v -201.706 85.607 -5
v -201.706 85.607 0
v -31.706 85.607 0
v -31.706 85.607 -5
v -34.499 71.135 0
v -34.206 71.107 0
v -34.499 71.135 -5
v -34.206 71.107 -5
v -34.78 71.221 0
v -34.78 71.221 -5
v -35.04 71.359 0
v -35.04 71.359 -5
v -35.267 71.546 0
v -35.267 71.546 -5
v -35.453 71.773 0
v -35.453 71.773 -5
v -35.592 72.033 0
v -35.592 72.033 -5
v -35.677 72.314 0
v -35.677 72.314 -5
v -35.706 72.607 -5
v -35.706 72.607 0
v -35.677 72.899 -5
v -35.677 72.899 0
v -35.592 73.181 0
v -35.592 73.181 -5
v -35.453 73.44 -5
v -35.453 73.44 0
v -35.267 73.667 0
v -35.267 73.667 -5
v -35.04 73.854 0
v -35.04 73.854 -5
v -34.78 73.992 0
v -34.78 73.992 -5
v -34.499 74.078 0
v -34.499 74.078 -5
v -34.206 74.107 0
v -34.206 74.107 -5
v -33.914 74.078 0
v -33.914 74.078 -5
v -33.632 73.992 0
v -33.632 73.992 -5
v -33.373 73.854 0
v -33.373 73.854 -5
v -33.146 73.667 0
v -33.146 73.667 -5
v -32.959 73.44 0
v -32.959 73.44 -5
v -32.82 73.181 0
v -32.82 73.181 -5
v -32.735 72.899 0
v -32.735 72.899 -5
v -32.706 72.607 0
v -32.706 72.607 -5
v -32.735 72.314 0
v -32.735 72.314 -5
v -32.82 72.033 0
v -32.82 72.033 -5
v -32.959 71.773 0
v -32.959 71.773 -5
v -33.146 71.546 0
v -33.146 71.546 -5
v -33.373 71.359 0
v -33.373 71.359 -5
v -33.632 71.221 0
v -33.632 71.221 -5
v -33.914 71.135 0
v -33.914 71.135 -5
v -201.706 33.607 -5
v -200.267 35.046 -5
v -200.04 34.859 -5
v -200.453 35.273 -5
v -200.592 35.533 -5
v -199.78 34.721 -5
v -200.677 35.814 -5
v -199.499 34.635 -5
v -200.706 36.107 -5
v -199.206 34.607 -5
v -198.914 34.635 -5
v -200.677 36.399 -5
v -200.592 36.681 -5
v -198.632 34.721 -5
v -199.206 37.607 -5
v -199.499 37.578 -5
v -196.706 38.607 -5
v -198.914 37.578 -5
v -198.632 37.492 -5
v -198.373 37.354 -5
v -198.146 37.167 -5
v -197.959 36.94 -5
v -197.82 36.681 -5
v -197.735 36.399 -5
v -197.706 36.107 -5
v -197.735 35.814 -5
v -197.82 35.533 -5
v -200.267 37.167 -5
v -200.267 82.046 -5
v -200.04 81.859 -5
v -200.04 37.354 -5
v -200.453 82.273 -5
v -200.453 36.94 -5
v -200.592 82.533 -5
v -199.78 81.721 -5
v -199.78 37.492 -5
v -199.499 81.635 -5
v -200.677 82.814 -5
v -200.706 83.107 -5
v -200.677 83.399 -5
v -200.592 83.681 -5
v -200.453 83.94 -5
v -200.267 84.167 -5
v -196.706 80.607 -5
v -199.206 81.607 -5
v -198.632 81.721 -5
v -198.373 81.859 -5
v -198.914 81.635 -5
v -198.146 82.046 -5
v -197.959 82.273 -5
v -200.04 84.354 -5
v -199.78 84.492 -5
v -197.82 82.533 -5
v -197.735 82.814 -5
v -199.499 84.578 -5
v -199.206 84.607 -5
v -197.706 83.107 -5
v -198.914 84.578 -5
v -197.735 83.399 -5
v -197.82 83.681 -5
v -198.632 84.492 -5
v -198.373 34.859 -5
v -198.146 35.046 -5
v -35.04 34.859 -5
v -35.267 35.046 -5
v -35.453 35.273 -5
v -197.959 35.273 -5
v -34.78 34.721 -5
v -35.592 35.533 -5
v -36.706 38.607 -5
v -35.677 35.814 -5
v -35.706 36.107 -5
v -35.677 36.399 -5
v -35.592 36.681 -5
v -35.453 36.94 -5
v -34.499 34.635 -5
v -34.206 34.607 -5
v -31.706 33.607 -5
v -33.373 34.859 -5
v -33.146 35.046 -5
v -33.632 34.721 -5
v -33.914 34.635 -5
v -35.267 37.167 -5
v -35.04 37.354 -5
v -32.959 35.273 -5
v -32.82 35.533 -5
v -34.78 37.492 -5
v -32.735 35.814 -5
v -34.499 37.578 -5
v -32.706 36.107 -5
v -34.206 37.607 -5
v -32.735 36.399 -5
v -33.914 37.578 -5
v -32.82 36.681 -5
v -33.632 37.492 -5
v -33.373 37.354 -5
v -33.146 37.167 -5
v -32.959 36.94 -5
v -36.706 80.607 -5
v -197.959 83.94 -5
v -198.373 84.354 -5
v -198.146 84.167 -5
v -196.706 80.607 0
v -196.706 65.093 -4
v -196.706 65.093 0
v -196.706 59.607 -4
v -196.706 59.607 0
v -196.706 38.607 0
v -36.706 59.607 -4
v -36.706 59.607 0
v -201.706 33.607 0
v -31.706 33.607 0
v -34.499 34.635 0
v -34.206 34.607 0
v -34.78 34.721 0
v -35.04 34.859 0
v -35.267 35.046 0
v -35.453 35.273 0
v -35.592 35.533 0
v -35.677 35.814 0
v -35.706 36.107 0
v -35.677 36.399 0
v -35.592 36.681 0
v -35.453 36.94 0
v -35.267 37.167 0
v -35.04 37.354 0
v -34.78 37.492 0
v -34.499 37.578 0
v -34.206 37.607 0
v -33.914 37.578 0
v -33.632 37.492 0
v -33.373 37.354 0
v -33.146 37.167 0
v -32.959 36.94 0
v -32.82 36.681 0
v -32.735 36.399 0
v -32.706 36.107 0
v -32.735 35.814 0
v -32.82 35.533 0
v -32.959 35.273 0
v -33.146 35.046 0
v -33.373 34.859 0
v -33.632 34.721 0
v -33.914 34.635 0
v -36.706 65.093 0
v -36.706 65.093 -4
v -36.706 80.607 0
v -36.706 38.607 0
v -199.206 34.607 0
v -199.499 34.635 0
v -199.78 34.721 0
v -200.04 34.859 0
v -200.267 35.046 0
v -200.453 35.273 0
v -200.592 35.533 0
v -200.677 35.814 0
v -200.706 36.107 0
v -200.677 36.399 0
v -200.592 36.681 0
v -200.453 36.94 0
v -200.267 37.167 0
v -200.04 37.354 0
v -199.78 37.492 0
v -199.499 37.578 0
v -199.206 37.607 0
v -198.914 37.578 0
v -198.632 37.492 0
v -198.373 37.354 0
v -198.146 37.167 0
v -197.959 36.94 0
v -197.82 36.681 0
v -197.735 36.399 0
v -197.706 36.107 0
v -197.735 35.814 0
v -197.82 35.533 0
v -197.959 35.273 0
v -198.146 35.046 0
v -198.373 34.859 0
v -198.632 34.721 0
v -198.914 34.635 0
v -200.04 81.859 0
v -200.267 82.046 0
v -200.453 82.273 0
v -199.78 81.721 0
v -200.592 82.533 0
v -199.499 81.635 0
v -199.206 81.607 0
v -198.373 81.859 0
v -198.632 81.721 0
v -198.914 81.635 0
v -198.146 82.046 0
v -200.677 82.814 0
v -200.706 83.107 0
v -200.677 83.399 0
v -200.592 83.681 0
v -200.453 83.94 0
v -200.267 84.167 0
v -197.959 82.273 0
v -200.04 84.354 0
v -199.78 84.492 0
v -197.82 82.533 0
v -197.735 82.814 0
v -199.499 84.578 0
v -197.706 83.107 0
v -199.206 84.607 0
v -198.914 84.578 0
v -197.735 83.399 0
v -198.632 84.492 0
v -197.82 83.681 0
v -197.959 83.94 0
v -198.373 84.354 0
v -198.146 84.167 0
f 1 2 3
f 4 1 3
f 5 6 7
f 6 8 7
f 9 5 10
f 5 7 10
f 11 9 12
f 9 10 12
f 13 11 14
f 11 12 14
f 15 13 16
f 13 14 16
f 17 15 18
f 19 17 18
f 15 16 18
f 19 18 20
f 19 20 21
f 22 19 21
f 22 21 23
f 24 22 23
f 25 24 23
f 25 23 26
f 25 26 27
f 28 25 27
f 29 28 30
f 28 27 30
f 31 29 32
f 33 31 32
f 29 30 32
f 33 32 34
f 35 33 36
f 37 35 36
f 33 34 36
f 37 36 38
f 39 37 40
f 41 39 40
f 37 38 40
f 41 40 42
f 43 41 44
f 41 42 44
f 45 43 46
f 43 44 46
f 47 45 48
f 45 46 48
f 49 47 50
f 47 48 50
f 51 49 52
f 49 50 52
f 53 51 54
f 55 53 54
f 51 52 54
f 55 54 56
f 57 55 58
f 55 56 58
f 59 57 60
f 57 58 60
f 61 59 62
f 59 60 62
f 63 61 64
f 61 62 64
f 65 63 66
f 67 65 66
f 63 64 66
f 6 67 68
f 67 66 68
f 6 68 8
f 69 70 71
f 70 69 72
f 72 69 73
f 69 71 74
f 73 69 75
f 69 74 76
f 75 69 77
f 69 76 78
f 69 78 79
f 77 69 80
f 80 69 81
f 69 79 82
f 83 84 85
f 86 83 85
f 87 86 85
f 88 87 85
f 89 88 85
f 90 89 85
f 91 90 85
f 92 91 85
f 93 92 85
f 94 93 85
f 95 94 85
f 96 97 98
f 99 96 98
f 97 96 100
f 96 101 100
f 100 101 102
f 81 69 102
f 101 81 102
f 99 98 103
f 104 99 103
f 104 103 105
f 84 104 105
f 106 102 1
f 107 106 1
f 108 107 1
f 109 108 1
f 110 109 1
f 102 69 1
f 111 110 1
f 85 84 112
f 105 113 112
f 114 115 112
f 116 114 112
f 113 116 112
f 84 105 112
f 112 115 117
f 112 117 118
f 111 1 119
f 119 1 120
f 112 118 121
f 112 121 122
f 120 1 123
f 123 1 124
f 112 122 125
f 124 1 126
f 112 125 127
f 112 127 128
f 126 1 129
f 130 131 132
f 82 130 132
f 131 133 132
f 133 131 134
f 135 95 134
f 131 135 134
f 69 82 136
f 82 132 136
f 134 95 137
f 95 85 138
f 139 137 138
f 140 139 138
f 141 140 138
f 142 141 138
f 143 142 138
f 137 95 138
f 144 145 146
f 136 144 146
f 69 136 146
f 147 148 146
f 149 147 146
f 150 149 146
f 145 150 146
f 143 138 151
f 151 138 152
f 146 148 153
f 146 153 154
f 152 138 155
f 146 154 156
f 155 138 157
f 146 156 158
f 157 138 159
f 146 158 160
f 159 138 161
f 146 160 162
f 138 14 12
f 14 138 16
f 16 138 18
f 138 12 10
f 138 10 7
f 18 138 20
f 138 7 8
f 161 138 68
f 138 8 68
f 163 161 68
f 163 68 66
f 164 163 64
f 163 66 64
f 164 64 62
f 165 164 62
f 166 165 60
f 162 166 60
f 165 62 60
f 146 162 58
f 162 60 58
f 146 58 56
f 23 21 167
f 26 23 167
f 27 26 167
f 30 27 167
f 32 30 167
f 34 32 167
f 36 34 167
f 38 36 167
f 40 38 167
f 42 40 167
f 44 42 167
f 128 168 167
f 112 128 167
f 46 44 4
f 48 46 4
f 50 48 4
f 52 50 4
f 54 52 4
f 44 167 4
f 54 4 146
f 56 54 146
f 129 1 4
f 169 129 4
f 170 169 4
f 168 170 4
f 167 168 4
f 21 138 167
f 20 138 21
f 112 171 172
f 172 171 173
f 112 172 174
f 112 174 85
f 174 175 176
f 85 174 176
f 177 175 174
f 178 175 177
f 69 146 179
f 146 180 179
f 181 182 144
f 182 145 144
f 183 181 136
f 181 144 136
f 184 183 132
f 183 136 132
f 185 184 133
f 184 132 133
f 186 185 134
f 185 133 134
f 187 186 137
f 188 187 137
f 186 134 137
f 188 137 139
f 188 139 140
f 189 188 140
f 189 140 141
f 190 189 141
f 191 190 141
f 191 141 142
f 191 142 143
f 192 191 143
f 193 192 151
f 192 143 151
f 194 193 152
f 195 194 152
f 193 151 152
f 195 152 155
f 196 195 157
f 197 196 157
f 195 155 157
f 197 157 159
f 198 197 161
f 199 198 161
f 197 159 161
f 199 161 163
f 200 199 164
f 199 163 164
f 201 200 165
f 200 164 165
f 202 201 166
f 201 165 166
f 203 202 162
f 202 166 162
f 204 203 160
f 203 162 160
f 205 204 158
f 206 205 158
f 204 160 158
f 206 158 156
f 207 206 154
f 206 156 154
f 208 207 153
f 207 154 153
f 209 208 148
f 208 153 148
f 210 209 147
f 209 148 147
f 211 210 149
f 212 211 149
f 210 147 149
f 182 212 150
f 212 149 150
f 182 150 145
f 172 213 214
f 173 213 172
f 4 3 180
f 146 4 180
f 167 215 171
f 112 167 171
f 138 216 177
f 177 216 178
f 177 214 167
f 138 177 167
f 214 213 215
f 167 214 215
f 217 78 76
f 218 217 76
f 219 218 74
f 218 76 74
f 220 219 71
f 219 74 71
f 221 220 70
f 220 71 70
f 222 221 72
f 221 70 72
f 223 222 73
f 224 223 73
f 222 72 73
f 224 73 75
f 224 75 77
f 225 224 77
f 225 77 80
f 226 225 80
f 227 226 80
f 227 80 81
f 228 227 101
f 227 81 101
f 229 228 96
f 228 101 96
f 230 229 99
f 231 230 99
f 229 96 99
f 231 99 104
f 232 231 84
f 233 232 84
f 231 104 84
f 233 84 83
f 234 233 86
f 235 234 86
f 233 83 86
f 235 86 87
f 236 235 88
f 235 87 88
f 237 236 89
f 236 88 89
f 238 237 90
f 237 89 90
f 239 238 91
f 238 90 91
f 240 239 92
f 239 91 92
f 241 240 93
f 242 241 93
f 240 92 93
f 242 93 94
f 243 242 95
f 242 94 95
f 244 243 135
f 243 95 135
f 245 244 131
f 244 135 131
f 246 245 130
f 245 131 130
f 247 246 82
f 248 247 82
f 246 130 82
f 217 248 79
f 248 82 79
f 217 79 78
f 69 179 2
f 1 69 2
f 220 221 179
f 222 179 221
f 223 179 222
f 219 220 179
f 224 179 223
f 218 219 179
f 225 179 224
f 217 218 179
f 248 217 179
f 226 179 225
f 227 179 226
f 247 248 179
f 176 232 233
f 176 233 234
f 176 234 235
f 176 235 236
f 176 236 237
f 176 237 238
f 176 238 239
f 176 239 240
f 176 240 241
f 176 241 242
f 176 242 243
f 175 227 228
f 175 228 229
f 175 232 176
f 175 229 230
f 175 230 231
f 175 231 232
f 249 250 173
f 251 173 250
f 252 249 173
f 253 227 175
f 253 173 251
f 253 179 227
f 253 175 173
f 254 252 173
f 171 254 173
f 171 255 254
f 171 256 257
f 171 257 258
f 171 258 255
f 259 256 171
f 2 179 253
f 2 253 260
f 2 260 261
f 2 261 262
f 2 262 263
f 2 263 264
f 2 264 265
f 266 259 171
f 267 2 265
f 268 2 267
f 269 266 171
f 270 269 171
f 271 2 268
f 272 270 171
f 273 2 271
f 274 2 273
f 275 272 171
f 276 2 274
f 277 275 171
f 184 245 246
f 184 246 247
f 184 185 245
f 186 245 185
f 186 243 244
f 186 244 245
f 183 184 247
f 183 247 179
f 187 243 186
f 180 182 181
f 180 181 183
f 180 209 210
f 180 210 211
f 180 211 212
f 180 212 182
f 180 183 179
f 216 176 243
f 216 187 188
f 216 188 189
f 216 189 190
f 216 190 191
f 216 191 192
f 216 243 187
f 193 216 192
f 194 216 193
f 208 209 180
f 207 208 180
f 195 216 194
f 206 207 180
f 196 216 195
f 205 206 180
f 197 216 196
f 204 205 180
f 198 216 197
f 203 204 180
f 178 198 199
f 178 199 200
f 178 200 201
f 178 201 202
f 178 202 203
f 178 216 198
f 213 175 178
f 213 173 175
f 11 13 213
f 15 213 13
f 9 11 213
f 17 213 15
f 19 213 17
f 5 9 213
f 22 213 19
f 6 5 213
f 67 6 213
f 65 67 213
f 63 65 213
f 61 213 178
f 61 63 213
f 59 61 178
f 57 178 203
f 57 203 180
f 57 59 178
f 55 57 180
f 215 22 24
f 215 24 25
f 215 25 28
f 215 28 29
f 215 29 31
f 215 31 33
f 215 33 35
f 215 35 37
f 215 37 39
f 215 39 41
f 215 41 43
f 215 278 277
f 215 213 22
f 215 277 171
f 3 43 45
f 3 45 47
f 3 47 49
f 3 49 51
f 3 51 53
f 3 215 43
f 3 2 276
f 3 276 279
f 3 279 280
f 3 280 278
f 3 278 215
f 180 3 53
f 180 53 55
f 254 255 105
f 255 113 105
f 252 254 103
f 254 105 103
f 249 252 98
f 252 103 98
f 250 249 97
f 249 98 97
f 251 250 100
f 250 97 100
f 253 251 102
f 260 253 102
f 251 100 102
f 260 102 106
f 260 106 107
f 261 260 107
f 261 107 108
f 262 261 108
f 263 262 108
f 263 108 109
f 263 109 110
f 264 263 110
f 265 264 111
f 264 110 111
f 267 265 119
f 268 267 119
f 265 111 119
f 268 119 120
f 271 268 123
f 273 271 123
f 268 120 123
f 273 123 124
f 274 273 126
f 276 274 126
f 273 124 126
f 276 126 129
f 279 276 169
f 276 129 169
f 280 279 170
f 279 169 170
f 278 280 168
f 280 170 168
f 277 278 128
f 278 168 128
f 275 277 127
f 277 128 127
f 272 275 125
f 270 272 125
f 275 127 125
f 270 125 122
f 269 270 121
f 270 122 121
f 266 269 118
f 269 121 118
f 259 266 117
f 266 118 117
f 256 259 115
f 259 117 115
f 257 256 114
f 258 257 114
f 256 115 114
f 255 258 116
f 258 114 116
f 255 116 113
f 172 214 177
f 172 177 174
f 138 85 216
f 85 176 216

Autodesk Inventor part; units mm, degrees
ref_plane "YZ Plane" through (0, 0, 0) normal (1, 0, 0) x (0, 1, 0)
ref_plane "XZ Plane" through (0, 0, 0) normal (0, 1, 0) x (-1, 0, 0)
sketch "Sketch1" plane through (0, 0, 0) normal (0, 0, 1) x (1, 0, 0)
  line L0 (-201.7062, 85.6066) -> (-31.7062, 85.6066)
  line L1 (-31.7062, 85.6066) -> (-31.7062, 33.6066)
  line L2 (-31.7062, 33.6066) -> (-201.7062, 33.6066)
  line L3 (-201.7062, 33.6066) -> (-201.7062, 85.6066)
  line L4 (-36.7062, 80.6066) -> (-196.7062, 80.6066)
  line L5 (-196.7062, 38.6066) -> (-36.7062, 38.6066)
  line L6 (-196.7062, 59.6066) -> (-36.7062, 59.6066)
  line L7 (-36.7062, 65.0934) -> (-196.7062, 65.0934)
  line L8 (-36.7062, 38.6066) -> (-36.7062, 59.6066)
  line L9 (-36.7062, 65.0934) -> (-36.7062, 80.6066)
  line L10 (-196.7062, 80.6066) -> (-196.7062, 65.0934)
  line L11 (-196.7062, 59.6066) -> (-196.7062, 38.6066)
  line L12 (-196.7062, 80.6066) -> (-201.7062, 80.6066)
  line L13 (-36.7062, 80.6066) -> (-31.7062, 80.6066)
  line L14 (-36.7062, 80.6066) -> (-36.7062, 85.6066)
  line L15 (-36.7062, 38.6066) -> (-36.7062, 33.6066)
  line L16 (-36.7062, 38.6066) -> (-31.7062, 38.6066)
  line L17 (-196.7062, 38.6066) -> (-201.7062, 38.6066)
  line L18 (-196.7062, 38.6066) -> (-196.7062, 33.6066)
  line L19 (-196.7062, 80.6066) -> (-196.7062, 85.6066)
  circle A0 centre (-199.2062, 83.1066) radius 2.5
  circle A1 centre (-199.2062, 36.1066) radius 2.5
  circle A2 centre (-34.2062, 36.1066) radius 2.5
  circle A3 centre (-34.2062, 72.6066) radius 2.5
  point P0 (0, 0)
extrude "Extrusion1" add sketch "Sketch1" against normal blind 5 contours L19 A0 L0 | L0 L14 L4 L19 | L0 L1 L13 L14 | A0 L3 L0 | A0 | L19 L12 A0 | L13 L1 A3 L9 | A0 L12 L3 | L10 L7 L9 A3 L1 L16 L8 L6 L11 L17 L3 L12 | A3 | L17 A1 L3 | L1 A2 L16 | A1 L2 L3 | A1 | L17 L18 A1 | A2 | L1 L2 A2 | A2 L15 L16 | A1 L18 L2 | L5 L15 L2 L18 | L2 L15 A2
ref_plane "Work Plane1" through (-31.7062, 85.6066, -5) normal (0, 0, 1) x (1, 0, 0)
sketch "Sketch2" plane through (0, 0, -5) normal (0, 0, -1) x (-1, 0, 0)
  line L0 (36.7062, 65.0934) -> (196.7062, 65.0934)
  line L1 (196.7062, 65.0934) -> (196.7062, 59.6066)
  line L2 (196.7062, 59.6066) -> (36.7062, 59.6066)
  line L3 (36.7062, 59.6066) -> (36.7062, 65.0934)
  point P0 (0, 0)
extrude "Extrusion2" cut sketch "Sketch2" against normal blind 1
hole "Hole1" at (-199.2062, 83.1066, 0) direction (0, 0, -1) diameter 3 depth 5 tip angle 118
hole "Hole2" at (-199.2062, 36.1066, 0) direction (0, 0, -1) diameter 3 depth 5 tip angle 118
hole "Hole4" at (-34.2062, 36.1066, 0) direction (0, 0, -1) diameter 3 depth 5 tip angle 118
hole "Hole5" at (-34.2062, 72.6066, 0) direction (0, 0, -1) diameter 3 depth 5 tip angle 118
thread "Thread1" size "M3x0.5" class "6H" standard "ANSI Metric M Profile" full length
thread "Thread2" size "M3x0.5" class "6H" standard "ANSI Metric M Profile" full length
thread "Thread3" size "M3x0.5" class "6H" standard "ANSI Metric M Profile" full length
thread "Thread4" size "M3x0.5" class "6H" standard "ANSI Metric M Profile" full length
properties part number "lateral suport"
